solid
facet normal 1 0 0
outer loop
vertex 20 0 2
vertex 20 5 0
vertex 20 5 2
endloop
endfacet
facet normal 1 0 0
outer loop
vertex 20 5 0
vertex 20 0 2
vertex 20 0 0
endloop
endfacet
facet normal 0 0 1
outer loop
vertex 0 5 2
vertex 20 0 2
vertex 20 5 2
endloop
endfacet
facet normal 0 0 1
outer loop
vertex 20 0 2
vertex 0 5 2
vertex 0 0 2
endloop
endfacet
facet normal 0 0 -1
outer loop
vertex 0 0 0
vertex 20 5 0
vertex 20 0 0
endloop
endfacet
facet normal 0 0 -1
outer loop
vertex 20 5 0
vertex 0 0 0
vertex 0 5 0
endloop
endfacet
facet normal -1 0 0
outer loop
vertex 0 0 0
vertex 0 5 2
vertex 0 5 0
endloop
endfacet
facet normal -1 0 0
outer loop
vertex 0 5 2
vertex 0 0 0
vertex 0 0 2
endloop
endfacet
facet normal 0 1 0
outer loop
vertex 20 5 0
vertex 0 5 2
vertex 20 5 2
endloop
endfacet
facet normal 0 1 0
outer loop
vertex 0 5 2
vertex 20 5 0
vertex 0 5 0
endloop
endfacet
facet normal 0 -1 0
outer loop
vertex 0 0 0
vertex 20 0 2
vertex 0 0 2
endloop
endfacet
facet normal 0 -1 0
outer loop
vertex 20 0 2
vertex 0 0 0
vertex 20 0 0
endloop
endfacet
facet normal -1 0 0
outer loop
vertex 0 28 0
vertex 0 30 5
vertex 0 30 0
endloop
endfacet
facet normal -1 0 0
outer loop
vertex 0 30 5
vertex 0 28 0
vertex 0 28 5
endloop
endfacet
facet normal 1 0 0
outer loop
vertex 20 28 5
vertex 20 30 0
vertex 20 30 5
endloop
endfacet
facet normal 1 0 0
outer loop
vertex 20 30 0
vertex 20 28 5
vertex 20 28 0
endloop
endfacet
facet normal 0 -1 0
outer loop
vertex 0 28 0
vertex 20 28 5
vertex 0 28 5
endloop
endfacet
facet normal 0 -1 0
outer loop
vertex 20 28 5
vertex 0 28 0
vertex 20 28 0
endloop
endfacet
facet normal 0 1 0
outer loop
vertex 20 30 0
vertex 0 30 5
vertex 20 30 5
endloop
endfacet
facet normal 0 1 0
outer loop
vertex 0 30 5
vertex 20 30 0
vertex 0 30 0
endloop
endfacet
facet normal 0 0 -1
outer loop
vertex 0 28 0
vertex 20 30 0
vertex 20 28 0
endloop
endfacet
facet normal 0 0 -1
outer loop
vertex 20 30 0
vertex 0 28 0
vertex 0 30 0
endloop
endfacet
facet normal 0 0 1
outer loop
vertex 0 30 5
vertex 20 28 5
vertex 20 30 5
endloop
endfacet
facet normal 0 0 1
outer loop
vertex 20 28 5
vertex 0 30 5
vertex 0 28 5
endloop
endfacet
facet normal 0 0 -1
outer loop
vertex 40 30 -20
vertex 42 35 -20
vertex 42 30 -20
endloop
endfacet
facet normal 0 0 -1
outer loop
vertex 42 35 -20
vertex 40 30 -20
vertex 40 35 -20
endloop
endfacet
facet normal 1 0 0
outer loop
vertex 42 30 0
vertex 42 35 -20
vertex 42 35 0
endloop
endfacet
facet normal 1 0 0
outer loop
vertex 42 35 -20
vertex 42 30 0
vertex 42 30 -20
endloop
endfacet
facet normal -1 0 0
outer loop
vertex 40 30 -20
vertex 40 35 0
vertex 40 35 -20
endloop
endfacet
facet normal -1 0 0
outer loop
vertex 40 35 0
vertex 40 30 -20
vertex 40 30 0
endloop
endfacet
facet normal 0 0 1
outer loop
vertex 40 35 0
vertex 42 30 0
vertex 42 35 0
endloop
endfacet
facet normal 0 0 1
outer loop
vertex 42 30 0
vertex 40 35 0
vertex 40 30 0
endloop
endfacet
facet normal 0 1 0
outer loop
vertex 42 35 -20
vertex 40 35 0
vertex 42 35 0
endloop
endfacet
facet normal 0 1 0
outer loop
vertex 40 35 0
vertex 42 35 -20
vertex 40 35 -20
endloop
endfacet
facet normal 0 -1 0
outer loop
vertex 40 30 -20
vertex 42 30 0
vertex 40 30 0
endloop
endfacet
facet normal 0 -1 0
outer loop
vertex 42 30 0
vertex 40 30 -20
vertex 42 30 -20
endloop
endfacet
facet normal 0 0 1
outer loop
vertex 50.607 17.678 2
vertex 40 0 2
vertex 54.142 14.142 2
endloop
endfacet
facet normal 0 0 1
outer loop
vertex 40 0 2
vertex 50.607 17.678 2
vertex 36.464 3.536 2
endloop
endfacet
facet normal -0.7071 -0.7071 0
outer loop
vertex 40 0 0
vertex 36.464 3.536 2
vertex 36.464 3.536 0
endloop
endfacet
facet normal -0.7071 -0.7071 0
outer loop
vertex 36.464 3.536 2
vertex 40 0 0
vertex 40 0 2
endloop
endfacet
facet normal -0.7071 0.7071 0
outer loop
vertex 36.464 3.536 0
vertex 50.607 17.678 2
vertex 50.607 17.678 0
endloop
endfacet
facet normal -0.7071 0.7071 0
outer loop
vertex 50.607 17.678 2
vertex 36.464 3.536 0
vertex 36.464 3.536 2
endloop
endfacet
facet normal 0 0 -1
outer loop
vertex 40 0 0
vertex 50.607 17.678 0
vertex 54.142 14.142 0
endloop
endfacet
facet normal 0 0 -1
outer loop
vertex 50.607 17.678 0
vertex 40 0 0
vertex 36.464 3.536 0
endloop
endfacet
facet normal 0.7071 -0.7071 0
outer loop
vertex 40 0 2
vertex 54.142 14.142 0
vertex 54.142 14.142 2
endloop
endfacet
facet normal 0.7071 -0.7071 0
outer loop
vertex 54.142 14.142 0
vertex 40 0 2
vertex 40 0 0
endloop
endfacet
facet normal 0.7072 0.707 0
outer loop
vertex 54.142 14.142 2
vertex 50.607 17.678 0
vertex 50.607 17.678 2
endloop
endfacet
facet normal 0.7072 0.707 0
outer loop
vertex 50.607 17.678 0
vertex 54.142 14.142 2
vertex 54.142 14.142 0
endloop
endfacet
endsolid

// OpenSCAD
use <../nscad-lib.scad>

color("lightgray") cube([20, 5, 2]);
color("red")   move(0, 30)  rx() cube([20, 5, 2]);     // rotate([90,0,0])
color("green") move(40, 30) ry() cube([20, 5, 2]);     // rotate([0,90,0])
color("blue")  move(40, 0)  rz(45) cube([20, 5, 2]);   // rotate([0,0,45])
